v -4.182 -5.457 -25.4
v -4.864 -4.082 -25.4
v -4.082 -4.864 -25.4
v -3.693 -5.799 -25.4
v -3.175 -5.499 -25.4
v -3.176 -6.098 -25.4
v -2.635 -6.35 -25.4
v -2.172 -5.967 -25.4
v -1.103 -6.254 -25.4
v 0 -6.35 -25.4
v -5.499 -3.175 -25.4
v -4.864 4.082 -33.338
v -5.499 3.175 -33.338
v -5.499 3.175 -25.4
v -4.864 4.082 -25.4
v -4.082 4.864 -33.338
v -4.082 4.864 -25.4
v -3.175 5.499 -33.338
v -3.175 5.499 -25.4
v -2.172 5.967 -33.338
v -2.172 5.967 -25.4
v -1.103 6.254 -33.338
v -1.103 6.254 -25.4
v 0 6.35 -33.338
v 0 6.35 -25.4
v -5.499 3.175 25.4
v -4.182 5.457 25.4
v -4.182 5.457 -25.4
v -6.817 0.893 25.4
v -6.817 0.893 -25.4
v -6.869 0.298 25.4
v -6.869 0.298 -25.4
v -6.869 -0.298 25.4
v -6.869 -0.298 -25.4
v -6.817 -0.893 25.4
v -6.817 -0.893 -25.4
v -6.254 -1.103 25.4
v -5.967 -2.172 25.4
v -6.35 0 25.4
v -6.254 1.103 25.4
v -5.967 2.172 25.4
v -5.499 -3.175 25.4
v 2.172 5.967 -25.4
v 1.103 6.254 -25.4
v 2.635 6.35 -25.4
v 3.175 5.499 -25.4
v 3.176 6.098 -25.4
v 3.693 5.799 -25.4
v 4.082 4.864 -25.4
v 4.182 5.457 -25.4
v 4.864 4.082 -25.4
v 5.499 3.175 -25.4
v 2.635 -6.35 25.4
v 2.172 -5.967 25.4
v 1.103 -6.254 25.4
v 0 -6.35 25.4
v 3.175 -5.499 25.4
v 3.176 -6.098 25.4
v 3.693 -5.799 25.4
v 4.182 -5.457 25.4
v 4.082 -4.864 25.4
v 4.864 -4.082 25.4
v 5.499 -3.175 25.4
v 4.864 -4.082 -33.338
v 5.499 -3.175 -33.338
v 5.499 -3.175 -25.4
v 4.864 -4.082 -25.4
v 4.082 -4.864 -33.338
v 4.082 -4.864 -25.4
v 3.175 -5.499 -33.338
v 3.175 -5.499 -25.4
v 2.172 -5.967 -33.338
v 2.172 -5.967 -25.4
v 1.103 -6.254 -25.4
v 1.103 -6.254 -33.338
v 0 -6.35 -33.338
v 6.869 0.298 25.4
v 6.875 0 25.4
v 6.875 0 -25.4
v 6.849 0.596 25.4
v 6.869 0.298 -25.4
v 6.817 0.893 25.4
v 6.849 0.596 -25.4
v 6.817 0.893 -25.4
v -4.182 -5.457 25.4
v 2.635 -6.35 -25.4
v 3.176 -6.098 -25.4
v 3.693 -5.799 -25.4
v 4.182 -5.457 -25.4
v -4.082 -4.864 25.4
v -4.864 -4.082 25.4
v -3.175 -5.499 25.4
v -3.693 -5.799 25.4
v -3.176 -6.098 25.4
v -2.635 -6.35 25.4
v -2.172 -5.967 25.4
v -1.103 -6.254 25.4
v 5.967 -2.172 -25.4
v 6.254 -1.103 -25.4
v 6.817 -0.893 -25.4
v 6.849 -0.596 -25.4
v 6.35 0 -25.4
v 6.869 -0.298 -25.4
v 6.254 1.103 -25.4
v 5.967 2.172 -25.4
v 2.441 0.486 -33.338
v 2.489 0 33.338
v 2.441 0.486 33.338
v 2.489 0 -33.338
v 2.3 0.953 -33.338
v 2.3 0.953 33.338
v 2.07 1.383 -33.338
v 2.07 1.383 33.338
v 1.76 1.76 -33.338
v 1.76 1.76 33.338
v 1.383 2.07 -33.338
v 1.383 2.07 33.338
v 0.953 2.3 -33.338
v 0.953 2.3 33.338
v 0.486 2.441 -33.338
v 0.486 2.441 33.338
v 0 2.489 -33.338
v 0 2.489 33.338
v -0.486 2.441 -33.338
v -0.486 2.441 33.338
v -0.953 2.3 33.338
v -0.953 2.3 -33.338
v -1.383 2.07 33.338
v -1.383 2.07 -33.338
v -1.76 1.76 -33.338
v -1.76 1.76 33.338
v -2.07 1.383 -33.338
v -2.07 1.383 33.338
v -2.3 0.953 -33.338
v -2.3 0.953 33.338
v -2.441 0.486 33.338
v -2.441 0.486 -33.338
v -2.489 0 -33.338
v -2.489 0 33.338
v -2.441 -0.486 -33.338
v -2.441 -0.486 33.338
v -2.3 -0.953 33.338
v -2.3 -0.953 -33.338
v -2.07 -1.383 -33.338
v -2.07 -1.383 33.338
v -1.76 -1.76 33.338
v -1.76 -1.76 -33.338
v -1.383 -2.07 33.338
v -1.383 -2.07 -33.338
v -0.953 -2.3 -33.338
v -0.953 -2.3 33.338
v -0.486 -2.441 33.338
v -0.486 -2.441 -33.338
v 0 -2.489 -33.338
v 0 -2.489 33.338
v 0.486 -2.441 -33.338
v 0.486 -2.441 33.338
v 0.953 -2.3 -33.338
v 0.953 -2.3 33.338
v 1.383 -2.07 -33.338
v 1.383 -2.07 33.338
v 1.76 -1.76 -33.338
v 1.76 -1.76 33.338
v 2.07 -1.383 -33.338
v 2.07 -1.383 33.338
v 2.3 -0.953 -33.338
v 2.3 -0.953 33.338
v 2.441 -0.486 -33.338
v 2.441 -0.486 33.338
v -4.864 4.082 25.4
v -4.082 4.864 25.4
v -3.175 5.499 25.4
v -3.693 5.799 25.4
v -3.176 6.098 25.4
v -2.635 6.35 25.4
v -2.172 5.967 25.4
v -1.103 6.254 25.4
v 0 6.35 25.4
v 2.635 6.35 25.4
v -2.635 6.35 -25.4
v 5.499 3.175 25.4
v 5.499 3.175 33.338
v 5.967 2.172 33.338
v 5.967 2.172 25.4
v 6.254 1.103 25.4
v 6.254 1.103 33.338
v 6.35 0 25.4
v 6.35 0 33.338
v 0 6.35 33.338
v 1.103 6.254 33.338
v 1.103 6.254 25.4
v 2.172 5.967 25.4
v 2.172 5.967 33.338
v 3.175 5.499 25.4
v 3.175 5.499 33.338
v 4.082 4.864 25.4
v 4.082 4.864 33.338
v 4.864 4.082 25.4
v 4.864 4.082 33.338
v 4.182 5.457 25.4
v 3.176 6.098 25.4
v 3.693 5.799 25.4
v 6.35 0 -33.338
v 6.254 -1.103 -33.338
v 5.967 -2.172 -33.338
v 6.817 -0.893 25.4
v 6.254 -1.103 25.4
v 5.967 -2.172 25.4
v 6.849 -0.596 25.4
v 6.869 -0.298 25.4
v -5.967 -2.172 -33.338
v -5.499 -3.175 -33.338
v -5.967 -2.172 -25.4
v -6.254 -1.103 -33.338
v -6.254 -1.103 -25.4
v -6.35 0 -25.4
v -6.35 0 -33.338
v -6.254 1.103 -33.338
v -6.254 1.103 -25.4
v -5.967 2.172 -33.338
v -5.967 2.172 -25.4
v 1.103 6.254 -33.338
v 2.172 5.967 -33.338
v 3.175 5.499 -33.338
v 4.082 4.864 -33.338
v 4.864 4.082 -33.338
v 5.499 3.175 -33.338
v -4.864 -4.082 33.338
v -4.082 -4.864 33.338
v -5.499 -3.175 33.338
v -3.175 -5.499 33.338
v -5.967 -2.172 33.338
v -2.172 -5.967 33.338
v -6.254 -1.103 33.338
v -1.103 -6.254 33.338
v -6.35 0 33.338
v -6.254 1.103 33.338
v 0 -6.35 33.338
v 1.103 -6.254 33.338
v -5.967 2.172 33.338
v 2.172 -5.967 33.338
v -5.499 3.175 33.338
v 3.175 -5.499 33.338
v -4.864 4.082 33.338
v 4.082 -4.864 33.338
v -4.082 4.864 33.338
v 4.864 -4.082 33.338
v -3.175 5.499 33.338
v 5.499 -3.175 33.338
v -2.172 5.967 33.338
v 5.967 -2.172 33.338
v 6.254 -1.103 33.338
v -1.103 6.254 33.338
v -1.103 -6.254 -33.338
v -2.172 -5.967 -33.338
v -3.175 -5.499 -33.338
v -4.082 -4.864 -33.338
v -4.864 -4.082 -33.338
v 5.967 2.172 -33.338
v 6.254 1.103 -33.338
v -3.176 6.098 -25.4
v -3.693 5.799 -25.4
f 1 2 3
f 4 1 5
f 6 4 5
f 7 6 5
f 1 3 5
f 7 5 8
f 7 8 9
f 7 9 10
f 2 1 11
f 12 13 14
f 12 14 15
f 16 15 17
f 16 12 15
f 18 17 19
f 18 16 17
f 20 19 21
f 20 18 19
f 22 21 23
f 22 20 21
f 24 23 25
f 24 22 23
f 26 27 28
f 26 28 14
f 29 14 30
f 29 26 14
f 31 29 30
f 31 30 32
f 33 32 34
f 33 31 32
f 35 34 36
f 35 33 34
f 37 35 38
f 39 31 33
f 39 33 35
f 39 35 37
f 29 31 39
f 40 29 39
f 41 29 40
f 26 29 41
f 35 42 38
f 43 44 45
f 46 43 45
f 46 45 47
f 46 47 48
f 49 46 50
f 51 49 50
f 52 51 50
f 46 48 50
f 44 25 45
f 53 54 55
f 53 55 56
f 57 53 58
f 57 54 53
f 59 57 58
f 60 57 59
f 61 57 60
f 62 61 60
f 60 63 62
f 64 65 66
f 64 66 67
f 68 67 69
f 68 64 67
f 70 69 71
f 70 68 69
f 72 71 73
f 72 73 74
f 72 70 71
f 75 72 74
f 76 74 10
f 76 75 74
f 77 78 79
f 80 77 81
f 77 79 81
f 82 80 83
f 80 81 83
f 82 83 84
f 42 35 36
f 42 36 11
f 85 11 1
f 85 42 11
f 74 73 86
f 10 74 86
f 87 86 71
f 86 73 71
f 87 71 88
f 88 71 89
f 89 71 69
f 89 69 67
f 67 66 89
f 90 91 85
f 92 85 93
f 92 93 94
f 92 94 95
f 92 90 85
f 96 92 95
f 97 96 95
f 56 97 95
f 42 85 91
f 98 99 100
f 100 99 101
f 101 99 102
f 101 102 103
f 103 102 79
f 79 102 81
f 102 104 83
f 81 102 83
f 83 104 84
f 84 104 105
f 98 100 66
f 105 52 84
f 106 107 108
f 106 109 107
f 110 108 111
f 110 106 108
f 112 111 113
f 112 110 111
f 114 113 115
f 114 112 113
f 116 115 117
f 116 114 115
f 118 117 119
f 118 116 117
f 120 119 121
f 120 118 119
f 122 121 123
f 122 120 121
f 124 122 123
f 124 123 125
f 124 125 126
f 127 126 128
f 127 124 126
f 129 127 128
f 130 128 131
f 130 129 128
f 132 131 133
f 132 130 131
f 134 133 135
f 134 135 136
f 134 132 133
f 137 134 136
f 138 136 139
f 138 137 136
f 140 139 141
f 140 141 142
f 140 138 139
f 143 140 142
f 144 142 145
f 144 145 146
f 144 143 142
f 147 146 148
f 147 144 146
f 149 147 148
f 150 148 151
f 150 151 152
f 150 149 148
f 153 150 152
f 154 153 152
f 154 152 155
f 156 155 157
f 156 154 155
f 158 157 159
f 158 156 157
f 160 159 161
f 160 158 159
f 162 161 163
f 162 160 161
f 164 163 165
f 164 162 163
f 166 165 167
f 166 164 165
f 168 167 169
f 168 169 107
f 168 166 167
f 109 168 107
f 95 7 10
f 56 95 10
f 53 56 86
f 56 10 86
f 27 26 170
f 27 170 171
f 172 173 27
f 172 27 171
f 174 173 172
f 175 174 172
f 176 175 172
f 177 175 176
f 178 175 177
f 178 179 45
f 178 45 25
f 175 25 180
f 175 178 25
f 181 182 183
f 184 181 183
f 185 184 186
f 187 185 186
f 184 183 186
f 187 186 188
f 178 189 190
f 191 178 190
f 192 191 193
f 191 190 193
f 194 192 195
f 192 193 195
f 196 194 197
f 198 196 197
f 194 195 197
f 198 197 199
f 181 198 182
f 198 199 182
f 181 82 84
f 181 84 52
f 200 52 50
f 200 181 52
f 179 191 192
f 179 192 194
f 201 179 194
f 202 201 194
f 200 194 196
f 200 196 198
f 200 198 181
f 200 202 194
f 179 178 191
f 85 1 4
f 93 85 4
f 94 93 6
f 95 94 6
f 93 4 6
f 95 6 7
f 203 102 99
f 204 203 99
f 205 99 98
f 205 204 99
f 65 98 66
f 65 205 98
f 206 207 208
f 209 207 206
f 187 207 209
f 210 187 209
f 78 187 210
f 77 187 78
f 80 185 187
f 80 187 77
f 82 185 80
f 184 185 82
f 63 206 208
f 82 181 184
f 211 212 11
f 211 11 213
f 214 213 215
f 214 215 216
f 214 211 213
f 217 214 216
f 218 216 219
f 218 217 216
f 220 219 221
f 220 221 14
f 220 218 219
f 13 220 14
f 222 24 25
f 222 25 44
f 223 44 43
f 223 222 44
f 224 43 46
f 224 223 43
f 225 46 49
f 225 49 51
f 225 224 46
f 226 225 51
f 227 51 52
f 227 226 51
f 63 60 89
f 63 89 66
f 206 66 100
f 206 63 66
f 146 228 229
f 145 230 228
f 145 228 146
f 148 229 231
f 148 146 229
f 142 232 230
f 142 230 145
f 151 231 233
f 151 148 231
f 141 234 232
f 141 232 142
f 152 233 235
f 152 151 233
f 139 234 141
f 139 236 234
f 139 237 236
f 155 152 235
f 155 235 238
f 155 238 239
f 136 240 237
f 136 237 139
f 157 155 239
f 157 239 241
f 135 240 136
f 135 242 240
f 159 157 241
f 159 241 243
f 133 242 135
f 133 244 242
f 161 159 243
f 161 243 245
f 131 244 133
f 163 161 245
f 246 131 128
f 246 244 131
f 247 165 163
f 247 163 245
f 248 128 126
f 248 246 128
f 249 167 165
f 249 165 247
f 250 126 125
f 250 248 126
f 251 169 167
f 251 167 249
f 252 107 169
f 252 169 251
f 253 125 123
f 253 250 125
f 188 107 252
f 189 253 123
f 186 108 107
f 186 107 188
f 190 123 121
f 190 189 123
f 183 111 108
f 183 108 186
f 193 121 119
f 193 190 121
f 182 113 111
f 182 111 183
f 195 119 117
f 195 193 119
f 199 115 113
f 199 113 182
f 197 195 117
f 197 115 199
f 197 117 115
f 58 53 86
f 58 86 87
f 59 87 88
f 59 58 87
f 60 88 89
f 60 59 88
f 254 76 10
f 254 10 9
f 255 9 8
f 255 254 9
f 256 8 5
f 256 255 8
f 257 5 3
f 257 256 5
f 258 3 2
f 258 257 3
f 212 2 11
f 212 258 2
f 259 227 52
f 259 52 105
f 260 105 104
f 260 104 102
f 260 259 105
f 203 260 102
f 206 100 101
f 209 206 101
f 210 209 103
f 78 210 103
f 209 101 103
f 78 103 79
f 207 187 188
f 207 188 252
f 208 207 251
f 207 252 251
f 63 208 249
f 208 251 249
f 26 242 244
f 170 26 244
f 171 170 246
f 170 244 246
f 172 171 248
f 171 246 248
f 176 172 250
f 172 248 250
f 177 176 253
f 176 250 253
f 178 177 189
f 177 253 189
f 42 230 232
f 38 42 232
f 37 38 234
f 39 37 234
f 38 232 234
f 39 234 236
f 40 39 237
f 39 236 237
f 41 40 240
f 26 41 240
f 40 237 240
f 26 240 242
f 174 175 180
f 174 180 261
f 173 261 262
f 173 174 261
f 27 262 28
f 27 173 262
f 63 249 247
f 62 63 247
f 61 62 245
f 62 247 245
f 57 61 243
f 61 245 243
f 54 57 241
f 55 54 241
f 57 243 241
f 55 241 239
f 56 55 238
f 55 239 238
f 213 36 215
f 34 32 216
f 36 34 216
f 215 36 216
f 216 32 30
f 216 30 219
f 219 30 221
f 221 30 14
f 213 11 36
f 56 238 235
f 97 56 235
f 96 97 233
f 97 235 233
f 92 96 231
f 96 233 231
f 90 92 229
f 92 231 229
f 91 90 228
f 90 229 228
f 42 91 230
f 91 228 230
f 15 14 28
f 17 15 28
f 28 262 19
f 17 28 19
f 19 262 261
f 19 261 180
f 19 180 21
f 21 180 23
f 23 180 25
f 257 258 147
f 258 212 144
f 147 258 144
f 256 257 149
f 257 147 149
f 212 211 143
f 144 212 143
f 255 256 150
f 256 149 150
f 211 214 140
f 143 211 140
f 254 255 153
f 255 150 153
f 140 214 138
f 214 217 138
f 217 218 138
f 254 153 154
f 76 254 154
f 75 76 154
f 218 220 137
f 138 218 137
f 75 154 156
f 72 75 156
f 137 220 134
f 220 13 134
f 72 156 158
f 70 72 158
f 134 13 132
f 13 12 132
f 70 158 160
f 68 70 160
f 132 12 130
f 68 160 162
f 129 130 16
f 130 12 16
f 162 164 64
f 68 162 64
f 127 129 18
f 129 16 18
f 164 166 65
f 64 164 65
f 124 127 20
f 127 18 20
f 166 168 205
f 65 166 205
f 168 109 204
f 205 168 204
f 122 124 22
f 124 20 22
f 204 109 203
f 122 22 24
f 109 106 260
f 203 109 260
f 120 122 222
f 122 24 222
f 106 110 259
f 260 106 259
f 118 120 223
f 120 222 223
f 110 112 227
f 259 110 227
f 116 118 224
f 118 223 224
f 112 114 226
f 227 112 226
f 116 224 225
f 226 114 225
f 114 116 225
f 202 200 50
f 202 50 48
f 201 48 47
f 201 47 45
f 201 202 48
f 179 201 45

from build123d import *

# Parameters (mm, degrees)
SKETCH1_R           = 2.4892
BOSS_EXTRUDE1_DEPTH = 33.3375
CUT_EXTRUDE2_DEPTH  = 7.9375


with BuildPart() as part:
    # Sketch1 → Boss-Extrude1 (new, symmetric)
    with BuildSketch(Plane.XY):
        with BuildLine():
            ThreePointArc((-2.634980936, 6.35), (-3.437499983, 5.953924622), (-4.181770846, 5.456960429))
            Line((-4.181770846, 5.456960429), (-6.816751782, 0.893039571))
            ThreePointArc((-6.816751782, 0.893039571), (-6.874999966, 0), (-6.816751782, -0.893039571))
            Line((-6.816751782, -0.893039571), (-4.181770846, -5.456960429))
            ThreePointArc((-4.181770846, -5.456960429), (-3.437499983, -5.953924622), (-2.634980936, -6.35))
            Line((-2.634980936, -6.35), (2.634980936, -6.35))
            ThreePointArc((2.634980936, -6.35), (3.437499983, -5.953924622), (4.181770846, -5.456960429))
            Line((4.181770846, -5.456960429), (6.816751782, -0.893039571))
            ThreePointArc((6.816751782, -0.893039571), (6.860422465, -0.447468582), (6.874999966, 0))
            ThreePointArc((6.874999966, 0), (6.860422465, 0.447468582), (6.816751782, 0.893039571))
            Line((6.816751782, 0.893039571), (4.181770846, 5.456960429))
            ThreePointArc((4.181770846, 5.456960429), (3.437499983, 5.953924622), (2.634980936, 6.35))
            Line((2.634980936, 6.35), (-2.634980936, 6.35))
        make_face()
        Circle(SKETCH1_R, mode=Mode.SUBTRACT)
    extrude(amount=BOSS_EXTRUDE1_DEPTH, both=True)

    # Sketch2 → Cut-Extrude2 (cut)
    with BuildSketch(Plane.XY.offset(33.3375)):
        with BuildLine():
            ThreePointArc((-5.499261332, 3.174999968), (-3.175000008, 5.499261309), (1.8e-08, 6.35))
            Line((1.8e-08, 6.35), (-2.634980936, 6.35))
            ThreePointArc((-2.634980936, 6.35), (-3.437499983, 5.953924622), (-4.181770846, 5.456960429))
            Line((-4.181770846, 5.456960429), (-5.499261332, 3.174999968))
        make_face()
        with BuildLine():
            ThreePointArc((1.8e-08, 6.35), (3.175000042, 5.49926129), (5.499261354, 3.174999932))
            Line((5.499261354, 3.174999932), (4.181770846, 5.456960429))
            ThreePointArc((4.181770846, 5.456960429), (3.437499983, 5.953924622), (2.634980936, 6.35))
            Line((2.634980936, 6.35), (1.8e-08, 6.35))
        make_face()
        with BuildLine():
            ThreePointArc((5.499261354, 3.174999932), (6.133629007, 1.643500898), (6.35, 0))
            ThreePointArc((6.35, 0), (6.133629, -1.643500924), (5.499261327, -3.174999977))
            Line((5.499261327, -3.174999977), (6.816751782, -0.893039571))
            ThreePointArc((6.816751782, -0.893039571), (6.874999966, 0), (6.816751782, 0.893039571))
            Line((6.816751782, 0.893039571), (5.499261354, 3.174999932))
        make_face()
        with BuildLine():
            Line((4.181770846, -5.456960429), (5.499261327, -3.174999977))
            ThreePointArc((5.499261327, -3.174999977), (3.175000011, -5.499261308), (0, -6.35))
            Line((0, -6.35), (2.634980936, -6.35))
            ThreePointArc((2.634980936, -6.35), (3.437499983, -5.953924622), (4.181770846, -5.456960429))
        make_face()
        with BuildLine():
            Line((-2.634980936, -6.35), (0, -6.35))
            ThreePointArc((0, -6.35), (-3.174999938, -5.49926135), (-5.499261242, -3.175000124))
            Line((-5.499261242, -3.175000124), (-4.181770846, -5.456960429))
            ThreePointArc((-4.181770846, -5.456960429), (-3.437499983, -5.953924622), (-2.634980936, -6.35))
        make_face()
        with BuildLine():
            ThreePointArc((-5.499261242, -3.175000124), (-6.35, -9e-08), (-5.499261332, 3.174999968))
            Line((-5.499261332, 3.174999968), (-6.816751782, 0.893039571))
            ThreePointArc((-6.816751782, 0.893039571), (-6.874999966, 0), (-6.816751782, -0.893039571))
            Line((-6.816751782, -0.893039571), (-5.499261242, -3.175000124))
        make_face()
    cut_extrude2 = extrude(amount=-CUT_EXTRUDE2_DEPTH, mode=Mode.SUBTRACT)

    # Mirror1: Cut-Extrude2 across plane
    add(cut_extrude2.mirror(Plane.XY), mode=Mode.SUBTRACT)


solid = part.part
